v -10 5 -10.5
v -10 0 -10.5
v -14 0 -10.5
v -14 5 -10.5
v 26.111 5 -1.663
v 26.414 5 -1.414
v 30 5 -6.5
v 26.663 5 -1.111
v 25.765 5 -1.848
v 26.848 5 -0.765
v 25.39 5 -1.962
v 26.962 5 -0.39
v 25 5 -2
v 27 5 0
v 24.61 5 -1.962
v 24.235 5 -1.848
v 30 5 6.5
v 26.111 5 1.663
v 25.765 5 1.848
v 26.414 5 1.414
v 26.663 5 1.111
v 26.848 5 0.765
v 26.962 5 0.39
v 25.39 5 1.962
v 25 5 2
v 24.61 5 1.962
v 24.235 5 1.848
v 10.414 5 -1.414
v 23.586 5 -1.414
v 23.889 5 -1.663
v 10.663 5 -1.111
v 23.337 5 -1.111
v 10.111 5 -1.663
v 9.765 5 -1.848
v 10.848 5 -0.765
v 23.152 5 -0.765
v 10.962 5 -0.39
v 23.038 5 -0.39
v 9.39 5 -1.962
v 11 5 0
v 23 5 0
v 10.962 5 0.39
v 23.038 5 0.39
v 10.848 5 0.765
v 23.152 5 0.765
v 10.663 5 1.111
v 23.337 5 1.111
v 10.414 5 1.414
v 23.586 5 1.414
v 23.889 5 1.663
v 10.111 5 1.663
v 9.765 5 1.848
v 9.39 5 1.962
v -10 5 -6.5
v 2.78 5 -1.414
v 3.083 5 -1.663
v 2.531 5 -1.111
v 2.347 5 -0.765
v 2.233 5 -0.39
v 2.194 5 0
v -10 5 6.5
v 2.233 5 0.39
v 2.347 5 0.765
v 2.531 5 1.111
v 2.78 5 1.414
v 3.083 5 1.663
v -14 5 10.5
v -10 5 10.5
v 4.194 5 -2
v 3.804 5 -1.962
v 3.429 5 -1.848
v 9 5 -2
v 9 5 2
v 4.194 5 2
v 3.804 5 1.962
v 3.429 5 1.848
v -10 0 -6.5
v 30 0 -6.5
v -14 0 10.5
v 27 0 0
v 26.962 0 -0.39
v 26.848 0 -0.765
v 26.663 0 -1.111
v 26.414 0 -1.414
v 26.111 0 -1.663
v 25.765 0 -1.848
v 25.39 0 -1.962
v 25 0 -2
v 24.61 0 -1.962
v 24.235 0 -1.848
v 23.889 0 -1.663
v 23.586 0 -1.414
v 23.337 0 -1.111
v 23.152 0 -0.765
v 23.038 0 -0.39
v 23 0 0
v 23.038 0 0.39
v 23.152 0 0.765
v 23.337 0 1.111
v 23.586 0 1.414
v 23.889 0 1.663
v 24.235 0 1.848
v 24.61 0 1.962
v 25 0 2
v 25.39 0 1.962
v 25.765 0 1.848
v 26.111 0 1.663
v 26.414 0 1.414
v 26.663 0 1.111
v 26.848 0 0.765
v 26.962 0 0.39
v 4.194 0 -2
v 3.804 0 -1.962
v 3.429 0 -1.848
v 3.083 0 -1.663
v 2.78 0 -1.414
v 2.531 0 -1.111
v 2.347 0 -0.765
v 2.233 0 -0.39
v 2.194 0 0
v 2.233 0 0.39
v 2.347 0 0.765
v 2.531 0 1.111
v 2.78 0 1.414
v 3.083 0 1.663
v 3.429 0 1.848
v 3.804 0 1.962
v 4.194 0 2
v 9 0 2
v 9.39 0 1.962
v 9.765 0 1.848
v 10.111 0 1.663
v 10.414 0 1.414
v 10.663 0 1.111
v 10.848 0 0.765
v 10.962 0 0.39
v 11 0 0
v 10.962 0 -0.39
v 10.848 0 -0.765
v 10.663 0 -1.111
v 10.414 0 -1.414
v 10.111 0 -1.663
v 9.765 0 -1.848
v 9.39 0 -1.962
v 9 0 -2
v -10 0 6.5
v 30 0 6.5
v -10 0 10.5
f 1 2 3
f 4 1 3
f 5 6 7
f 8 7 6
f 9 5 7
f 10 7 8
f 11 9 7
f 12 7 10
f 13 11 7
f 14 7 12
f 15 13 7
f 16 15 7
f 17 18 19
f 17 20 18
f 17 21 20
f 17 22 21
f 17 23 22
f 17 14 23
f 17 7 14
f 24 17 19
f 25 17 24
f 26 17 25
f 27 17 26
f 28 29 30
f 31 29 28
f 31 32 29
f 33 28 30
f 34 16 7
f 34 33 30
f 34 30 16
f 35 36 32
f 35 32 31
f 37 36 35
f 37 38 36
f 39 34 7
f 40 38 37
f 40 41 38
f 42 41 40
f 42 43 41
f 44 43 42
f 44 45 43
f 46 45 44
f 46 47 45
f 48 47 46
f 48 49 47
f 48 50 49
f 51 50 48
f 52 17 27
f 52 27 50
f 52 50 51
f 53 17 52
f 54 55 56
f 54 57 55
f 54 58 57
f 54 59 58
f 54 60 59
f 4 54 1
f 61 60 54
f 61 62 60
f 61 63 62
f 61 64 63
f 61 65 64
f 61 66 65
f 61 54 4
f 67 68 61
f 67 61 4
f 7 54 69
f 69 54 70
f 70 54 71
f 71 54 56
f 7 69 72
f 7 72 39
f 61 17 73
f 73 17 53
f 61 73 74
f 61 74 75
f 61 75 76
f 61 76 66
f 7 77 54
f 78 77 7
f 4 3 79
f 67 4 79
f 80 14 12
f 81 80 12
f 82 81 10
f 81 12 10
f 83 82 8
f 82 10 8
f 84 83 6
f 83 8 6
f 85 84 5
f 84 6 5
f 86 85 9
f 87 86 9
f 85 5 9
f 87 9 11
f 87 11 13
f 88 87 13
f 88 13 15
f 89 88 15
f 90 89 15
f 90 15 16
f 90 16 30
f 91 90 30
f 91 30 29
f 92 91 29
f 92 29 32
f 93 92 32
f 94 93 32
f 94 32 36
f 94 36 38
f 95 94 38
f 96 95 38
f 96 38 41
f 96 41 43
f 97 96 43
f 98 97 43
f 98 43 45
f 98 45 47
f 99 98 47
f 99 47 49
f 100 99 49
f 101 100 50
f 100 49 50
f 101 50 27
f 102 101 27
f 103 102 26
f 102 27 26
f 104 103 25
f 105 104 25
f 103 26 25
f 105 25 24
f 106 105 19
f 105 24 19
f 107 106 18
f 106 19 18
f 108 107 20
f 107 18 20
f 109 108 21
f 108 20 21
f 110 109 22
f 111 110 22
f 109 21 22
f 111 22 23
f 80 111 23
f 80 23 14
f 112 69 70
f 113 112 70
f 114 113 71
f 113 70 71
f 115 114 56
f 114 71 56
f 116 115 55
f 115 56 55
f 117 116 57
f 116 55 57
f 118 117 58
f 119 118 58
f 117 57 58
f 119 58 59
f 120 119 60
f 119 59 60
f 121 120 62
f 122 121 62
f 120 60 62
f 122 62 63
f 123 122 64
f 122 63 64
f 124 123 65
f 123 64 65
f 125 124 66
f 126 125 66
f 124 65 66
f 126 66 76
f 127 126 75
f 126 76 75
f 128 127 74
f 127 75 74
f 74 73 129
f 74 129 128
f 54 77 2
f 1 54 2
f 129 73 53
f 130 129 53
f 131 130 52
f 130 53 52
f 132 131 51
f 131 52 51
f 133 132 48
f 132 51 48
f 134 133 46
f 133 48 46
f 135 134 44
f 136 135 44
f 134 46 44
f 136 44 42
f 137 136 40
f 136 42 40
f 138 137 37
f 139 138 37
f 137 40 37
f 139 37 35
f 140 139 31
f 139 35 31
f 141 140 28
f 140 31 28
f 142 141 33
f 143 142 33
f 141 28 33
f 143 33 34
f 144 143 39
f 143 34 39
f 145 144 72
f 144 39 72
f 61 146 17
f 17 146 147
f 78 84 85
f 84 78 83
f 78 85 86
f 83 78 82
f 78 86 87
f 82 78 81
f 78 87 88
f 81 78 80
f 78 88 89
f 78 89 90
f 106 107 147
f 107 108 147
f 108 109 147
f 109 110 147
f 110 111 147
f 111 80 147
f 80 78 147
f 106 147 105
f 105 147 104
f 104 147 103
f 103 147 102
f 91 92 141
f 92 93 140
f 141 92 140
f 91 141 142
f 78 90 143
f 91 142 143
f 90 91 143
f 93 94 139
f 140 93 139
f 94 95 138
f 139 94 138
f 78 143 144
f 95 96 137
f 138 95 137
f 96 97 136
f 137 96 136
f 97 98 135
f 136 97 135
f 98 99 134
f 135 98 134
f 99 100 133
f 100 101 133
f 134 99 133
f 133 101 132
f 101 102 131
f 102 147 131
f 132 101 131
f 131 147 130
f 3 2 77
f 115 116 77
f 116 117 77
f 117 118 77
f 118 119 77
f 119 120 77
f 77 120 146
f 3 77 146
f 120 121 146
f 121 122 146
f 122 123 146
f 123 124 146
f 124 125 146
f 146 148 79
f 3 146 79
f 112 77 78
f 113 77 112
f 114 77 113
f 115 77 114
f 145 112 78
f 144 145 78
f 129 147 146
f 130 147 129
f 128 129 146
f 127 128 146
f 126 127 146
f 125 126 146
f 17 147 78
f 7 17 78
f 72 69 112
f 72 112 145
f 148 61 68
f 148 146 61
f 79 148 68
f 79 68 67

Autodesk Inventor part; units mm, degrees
ref_plane "YZ Plane" through (0, 0, 0) normal (1, 0, 0) x (0, 1, 0)
ref_plane "XZ Plane" through (0, 0, 0) normal (0, 1, 0) x (-1, 0, 0)
ref_plane "XY Plane" through (0, 0, 0) normal (0, 0, 1) x (1, 0, 0)
sketch "Sketch1" plane through (0, 0, 0) normal (0, 1, 0) x (-1, 0, 0)
  line L0 (10, -6.5) -> (-30, -6.5)
  line L1 (10, -10.5) -> (14, -10.5)
  line L2 (14, -10.5) -> (14, 0)
  line L3 (10, -6.5) -> (10, -10.5)
  line L4 (-30, 0) -> (-30, -6.5)
  line L5 (10, 6.5) -> (-30, 6.5)
  line L6 (10, 10.5) -> (14, 10.5)
  line L7 (14, 10.5) -> (14, 0)
  line L8 (10, 6.5) -> (10, 10.5)
  line L9 (-30, 0) -> (-30, 6.5)
  point P0 (0, 0)
  dimension "d0" = 40
  dimension "d5" = 4
  dimension "d15" = 13
extrude "Extrusion1" add sketch "Sketch1" along normal blind 5
sketch "Sketch2" plane through (0, 5, 0) normal (0, 1, 0) x (1, 0, 0)
  circle A0 centre (25, 0) radius 2
  arc A1 (9, -2) -> (9, 2) centre (9, 0) ccw
  arc A2 (4.1943, 2) -> (4.1943, -2) centre (4.1943, 0) ccw
  line L0 (9, -2) -> (4.1943, -2)
  line L1 (4.1943, 2) -> (9, 2)
  point P0 (0, 0)
  dimension "d8" = 4
  dimension "d10" = 4
  dimension "d11" = 12
  dimension "d12" = 4
extrude "Extrusion2" cut sketch "Sketch2" against normal blind 7.75
properties part number "motor_fastening"
